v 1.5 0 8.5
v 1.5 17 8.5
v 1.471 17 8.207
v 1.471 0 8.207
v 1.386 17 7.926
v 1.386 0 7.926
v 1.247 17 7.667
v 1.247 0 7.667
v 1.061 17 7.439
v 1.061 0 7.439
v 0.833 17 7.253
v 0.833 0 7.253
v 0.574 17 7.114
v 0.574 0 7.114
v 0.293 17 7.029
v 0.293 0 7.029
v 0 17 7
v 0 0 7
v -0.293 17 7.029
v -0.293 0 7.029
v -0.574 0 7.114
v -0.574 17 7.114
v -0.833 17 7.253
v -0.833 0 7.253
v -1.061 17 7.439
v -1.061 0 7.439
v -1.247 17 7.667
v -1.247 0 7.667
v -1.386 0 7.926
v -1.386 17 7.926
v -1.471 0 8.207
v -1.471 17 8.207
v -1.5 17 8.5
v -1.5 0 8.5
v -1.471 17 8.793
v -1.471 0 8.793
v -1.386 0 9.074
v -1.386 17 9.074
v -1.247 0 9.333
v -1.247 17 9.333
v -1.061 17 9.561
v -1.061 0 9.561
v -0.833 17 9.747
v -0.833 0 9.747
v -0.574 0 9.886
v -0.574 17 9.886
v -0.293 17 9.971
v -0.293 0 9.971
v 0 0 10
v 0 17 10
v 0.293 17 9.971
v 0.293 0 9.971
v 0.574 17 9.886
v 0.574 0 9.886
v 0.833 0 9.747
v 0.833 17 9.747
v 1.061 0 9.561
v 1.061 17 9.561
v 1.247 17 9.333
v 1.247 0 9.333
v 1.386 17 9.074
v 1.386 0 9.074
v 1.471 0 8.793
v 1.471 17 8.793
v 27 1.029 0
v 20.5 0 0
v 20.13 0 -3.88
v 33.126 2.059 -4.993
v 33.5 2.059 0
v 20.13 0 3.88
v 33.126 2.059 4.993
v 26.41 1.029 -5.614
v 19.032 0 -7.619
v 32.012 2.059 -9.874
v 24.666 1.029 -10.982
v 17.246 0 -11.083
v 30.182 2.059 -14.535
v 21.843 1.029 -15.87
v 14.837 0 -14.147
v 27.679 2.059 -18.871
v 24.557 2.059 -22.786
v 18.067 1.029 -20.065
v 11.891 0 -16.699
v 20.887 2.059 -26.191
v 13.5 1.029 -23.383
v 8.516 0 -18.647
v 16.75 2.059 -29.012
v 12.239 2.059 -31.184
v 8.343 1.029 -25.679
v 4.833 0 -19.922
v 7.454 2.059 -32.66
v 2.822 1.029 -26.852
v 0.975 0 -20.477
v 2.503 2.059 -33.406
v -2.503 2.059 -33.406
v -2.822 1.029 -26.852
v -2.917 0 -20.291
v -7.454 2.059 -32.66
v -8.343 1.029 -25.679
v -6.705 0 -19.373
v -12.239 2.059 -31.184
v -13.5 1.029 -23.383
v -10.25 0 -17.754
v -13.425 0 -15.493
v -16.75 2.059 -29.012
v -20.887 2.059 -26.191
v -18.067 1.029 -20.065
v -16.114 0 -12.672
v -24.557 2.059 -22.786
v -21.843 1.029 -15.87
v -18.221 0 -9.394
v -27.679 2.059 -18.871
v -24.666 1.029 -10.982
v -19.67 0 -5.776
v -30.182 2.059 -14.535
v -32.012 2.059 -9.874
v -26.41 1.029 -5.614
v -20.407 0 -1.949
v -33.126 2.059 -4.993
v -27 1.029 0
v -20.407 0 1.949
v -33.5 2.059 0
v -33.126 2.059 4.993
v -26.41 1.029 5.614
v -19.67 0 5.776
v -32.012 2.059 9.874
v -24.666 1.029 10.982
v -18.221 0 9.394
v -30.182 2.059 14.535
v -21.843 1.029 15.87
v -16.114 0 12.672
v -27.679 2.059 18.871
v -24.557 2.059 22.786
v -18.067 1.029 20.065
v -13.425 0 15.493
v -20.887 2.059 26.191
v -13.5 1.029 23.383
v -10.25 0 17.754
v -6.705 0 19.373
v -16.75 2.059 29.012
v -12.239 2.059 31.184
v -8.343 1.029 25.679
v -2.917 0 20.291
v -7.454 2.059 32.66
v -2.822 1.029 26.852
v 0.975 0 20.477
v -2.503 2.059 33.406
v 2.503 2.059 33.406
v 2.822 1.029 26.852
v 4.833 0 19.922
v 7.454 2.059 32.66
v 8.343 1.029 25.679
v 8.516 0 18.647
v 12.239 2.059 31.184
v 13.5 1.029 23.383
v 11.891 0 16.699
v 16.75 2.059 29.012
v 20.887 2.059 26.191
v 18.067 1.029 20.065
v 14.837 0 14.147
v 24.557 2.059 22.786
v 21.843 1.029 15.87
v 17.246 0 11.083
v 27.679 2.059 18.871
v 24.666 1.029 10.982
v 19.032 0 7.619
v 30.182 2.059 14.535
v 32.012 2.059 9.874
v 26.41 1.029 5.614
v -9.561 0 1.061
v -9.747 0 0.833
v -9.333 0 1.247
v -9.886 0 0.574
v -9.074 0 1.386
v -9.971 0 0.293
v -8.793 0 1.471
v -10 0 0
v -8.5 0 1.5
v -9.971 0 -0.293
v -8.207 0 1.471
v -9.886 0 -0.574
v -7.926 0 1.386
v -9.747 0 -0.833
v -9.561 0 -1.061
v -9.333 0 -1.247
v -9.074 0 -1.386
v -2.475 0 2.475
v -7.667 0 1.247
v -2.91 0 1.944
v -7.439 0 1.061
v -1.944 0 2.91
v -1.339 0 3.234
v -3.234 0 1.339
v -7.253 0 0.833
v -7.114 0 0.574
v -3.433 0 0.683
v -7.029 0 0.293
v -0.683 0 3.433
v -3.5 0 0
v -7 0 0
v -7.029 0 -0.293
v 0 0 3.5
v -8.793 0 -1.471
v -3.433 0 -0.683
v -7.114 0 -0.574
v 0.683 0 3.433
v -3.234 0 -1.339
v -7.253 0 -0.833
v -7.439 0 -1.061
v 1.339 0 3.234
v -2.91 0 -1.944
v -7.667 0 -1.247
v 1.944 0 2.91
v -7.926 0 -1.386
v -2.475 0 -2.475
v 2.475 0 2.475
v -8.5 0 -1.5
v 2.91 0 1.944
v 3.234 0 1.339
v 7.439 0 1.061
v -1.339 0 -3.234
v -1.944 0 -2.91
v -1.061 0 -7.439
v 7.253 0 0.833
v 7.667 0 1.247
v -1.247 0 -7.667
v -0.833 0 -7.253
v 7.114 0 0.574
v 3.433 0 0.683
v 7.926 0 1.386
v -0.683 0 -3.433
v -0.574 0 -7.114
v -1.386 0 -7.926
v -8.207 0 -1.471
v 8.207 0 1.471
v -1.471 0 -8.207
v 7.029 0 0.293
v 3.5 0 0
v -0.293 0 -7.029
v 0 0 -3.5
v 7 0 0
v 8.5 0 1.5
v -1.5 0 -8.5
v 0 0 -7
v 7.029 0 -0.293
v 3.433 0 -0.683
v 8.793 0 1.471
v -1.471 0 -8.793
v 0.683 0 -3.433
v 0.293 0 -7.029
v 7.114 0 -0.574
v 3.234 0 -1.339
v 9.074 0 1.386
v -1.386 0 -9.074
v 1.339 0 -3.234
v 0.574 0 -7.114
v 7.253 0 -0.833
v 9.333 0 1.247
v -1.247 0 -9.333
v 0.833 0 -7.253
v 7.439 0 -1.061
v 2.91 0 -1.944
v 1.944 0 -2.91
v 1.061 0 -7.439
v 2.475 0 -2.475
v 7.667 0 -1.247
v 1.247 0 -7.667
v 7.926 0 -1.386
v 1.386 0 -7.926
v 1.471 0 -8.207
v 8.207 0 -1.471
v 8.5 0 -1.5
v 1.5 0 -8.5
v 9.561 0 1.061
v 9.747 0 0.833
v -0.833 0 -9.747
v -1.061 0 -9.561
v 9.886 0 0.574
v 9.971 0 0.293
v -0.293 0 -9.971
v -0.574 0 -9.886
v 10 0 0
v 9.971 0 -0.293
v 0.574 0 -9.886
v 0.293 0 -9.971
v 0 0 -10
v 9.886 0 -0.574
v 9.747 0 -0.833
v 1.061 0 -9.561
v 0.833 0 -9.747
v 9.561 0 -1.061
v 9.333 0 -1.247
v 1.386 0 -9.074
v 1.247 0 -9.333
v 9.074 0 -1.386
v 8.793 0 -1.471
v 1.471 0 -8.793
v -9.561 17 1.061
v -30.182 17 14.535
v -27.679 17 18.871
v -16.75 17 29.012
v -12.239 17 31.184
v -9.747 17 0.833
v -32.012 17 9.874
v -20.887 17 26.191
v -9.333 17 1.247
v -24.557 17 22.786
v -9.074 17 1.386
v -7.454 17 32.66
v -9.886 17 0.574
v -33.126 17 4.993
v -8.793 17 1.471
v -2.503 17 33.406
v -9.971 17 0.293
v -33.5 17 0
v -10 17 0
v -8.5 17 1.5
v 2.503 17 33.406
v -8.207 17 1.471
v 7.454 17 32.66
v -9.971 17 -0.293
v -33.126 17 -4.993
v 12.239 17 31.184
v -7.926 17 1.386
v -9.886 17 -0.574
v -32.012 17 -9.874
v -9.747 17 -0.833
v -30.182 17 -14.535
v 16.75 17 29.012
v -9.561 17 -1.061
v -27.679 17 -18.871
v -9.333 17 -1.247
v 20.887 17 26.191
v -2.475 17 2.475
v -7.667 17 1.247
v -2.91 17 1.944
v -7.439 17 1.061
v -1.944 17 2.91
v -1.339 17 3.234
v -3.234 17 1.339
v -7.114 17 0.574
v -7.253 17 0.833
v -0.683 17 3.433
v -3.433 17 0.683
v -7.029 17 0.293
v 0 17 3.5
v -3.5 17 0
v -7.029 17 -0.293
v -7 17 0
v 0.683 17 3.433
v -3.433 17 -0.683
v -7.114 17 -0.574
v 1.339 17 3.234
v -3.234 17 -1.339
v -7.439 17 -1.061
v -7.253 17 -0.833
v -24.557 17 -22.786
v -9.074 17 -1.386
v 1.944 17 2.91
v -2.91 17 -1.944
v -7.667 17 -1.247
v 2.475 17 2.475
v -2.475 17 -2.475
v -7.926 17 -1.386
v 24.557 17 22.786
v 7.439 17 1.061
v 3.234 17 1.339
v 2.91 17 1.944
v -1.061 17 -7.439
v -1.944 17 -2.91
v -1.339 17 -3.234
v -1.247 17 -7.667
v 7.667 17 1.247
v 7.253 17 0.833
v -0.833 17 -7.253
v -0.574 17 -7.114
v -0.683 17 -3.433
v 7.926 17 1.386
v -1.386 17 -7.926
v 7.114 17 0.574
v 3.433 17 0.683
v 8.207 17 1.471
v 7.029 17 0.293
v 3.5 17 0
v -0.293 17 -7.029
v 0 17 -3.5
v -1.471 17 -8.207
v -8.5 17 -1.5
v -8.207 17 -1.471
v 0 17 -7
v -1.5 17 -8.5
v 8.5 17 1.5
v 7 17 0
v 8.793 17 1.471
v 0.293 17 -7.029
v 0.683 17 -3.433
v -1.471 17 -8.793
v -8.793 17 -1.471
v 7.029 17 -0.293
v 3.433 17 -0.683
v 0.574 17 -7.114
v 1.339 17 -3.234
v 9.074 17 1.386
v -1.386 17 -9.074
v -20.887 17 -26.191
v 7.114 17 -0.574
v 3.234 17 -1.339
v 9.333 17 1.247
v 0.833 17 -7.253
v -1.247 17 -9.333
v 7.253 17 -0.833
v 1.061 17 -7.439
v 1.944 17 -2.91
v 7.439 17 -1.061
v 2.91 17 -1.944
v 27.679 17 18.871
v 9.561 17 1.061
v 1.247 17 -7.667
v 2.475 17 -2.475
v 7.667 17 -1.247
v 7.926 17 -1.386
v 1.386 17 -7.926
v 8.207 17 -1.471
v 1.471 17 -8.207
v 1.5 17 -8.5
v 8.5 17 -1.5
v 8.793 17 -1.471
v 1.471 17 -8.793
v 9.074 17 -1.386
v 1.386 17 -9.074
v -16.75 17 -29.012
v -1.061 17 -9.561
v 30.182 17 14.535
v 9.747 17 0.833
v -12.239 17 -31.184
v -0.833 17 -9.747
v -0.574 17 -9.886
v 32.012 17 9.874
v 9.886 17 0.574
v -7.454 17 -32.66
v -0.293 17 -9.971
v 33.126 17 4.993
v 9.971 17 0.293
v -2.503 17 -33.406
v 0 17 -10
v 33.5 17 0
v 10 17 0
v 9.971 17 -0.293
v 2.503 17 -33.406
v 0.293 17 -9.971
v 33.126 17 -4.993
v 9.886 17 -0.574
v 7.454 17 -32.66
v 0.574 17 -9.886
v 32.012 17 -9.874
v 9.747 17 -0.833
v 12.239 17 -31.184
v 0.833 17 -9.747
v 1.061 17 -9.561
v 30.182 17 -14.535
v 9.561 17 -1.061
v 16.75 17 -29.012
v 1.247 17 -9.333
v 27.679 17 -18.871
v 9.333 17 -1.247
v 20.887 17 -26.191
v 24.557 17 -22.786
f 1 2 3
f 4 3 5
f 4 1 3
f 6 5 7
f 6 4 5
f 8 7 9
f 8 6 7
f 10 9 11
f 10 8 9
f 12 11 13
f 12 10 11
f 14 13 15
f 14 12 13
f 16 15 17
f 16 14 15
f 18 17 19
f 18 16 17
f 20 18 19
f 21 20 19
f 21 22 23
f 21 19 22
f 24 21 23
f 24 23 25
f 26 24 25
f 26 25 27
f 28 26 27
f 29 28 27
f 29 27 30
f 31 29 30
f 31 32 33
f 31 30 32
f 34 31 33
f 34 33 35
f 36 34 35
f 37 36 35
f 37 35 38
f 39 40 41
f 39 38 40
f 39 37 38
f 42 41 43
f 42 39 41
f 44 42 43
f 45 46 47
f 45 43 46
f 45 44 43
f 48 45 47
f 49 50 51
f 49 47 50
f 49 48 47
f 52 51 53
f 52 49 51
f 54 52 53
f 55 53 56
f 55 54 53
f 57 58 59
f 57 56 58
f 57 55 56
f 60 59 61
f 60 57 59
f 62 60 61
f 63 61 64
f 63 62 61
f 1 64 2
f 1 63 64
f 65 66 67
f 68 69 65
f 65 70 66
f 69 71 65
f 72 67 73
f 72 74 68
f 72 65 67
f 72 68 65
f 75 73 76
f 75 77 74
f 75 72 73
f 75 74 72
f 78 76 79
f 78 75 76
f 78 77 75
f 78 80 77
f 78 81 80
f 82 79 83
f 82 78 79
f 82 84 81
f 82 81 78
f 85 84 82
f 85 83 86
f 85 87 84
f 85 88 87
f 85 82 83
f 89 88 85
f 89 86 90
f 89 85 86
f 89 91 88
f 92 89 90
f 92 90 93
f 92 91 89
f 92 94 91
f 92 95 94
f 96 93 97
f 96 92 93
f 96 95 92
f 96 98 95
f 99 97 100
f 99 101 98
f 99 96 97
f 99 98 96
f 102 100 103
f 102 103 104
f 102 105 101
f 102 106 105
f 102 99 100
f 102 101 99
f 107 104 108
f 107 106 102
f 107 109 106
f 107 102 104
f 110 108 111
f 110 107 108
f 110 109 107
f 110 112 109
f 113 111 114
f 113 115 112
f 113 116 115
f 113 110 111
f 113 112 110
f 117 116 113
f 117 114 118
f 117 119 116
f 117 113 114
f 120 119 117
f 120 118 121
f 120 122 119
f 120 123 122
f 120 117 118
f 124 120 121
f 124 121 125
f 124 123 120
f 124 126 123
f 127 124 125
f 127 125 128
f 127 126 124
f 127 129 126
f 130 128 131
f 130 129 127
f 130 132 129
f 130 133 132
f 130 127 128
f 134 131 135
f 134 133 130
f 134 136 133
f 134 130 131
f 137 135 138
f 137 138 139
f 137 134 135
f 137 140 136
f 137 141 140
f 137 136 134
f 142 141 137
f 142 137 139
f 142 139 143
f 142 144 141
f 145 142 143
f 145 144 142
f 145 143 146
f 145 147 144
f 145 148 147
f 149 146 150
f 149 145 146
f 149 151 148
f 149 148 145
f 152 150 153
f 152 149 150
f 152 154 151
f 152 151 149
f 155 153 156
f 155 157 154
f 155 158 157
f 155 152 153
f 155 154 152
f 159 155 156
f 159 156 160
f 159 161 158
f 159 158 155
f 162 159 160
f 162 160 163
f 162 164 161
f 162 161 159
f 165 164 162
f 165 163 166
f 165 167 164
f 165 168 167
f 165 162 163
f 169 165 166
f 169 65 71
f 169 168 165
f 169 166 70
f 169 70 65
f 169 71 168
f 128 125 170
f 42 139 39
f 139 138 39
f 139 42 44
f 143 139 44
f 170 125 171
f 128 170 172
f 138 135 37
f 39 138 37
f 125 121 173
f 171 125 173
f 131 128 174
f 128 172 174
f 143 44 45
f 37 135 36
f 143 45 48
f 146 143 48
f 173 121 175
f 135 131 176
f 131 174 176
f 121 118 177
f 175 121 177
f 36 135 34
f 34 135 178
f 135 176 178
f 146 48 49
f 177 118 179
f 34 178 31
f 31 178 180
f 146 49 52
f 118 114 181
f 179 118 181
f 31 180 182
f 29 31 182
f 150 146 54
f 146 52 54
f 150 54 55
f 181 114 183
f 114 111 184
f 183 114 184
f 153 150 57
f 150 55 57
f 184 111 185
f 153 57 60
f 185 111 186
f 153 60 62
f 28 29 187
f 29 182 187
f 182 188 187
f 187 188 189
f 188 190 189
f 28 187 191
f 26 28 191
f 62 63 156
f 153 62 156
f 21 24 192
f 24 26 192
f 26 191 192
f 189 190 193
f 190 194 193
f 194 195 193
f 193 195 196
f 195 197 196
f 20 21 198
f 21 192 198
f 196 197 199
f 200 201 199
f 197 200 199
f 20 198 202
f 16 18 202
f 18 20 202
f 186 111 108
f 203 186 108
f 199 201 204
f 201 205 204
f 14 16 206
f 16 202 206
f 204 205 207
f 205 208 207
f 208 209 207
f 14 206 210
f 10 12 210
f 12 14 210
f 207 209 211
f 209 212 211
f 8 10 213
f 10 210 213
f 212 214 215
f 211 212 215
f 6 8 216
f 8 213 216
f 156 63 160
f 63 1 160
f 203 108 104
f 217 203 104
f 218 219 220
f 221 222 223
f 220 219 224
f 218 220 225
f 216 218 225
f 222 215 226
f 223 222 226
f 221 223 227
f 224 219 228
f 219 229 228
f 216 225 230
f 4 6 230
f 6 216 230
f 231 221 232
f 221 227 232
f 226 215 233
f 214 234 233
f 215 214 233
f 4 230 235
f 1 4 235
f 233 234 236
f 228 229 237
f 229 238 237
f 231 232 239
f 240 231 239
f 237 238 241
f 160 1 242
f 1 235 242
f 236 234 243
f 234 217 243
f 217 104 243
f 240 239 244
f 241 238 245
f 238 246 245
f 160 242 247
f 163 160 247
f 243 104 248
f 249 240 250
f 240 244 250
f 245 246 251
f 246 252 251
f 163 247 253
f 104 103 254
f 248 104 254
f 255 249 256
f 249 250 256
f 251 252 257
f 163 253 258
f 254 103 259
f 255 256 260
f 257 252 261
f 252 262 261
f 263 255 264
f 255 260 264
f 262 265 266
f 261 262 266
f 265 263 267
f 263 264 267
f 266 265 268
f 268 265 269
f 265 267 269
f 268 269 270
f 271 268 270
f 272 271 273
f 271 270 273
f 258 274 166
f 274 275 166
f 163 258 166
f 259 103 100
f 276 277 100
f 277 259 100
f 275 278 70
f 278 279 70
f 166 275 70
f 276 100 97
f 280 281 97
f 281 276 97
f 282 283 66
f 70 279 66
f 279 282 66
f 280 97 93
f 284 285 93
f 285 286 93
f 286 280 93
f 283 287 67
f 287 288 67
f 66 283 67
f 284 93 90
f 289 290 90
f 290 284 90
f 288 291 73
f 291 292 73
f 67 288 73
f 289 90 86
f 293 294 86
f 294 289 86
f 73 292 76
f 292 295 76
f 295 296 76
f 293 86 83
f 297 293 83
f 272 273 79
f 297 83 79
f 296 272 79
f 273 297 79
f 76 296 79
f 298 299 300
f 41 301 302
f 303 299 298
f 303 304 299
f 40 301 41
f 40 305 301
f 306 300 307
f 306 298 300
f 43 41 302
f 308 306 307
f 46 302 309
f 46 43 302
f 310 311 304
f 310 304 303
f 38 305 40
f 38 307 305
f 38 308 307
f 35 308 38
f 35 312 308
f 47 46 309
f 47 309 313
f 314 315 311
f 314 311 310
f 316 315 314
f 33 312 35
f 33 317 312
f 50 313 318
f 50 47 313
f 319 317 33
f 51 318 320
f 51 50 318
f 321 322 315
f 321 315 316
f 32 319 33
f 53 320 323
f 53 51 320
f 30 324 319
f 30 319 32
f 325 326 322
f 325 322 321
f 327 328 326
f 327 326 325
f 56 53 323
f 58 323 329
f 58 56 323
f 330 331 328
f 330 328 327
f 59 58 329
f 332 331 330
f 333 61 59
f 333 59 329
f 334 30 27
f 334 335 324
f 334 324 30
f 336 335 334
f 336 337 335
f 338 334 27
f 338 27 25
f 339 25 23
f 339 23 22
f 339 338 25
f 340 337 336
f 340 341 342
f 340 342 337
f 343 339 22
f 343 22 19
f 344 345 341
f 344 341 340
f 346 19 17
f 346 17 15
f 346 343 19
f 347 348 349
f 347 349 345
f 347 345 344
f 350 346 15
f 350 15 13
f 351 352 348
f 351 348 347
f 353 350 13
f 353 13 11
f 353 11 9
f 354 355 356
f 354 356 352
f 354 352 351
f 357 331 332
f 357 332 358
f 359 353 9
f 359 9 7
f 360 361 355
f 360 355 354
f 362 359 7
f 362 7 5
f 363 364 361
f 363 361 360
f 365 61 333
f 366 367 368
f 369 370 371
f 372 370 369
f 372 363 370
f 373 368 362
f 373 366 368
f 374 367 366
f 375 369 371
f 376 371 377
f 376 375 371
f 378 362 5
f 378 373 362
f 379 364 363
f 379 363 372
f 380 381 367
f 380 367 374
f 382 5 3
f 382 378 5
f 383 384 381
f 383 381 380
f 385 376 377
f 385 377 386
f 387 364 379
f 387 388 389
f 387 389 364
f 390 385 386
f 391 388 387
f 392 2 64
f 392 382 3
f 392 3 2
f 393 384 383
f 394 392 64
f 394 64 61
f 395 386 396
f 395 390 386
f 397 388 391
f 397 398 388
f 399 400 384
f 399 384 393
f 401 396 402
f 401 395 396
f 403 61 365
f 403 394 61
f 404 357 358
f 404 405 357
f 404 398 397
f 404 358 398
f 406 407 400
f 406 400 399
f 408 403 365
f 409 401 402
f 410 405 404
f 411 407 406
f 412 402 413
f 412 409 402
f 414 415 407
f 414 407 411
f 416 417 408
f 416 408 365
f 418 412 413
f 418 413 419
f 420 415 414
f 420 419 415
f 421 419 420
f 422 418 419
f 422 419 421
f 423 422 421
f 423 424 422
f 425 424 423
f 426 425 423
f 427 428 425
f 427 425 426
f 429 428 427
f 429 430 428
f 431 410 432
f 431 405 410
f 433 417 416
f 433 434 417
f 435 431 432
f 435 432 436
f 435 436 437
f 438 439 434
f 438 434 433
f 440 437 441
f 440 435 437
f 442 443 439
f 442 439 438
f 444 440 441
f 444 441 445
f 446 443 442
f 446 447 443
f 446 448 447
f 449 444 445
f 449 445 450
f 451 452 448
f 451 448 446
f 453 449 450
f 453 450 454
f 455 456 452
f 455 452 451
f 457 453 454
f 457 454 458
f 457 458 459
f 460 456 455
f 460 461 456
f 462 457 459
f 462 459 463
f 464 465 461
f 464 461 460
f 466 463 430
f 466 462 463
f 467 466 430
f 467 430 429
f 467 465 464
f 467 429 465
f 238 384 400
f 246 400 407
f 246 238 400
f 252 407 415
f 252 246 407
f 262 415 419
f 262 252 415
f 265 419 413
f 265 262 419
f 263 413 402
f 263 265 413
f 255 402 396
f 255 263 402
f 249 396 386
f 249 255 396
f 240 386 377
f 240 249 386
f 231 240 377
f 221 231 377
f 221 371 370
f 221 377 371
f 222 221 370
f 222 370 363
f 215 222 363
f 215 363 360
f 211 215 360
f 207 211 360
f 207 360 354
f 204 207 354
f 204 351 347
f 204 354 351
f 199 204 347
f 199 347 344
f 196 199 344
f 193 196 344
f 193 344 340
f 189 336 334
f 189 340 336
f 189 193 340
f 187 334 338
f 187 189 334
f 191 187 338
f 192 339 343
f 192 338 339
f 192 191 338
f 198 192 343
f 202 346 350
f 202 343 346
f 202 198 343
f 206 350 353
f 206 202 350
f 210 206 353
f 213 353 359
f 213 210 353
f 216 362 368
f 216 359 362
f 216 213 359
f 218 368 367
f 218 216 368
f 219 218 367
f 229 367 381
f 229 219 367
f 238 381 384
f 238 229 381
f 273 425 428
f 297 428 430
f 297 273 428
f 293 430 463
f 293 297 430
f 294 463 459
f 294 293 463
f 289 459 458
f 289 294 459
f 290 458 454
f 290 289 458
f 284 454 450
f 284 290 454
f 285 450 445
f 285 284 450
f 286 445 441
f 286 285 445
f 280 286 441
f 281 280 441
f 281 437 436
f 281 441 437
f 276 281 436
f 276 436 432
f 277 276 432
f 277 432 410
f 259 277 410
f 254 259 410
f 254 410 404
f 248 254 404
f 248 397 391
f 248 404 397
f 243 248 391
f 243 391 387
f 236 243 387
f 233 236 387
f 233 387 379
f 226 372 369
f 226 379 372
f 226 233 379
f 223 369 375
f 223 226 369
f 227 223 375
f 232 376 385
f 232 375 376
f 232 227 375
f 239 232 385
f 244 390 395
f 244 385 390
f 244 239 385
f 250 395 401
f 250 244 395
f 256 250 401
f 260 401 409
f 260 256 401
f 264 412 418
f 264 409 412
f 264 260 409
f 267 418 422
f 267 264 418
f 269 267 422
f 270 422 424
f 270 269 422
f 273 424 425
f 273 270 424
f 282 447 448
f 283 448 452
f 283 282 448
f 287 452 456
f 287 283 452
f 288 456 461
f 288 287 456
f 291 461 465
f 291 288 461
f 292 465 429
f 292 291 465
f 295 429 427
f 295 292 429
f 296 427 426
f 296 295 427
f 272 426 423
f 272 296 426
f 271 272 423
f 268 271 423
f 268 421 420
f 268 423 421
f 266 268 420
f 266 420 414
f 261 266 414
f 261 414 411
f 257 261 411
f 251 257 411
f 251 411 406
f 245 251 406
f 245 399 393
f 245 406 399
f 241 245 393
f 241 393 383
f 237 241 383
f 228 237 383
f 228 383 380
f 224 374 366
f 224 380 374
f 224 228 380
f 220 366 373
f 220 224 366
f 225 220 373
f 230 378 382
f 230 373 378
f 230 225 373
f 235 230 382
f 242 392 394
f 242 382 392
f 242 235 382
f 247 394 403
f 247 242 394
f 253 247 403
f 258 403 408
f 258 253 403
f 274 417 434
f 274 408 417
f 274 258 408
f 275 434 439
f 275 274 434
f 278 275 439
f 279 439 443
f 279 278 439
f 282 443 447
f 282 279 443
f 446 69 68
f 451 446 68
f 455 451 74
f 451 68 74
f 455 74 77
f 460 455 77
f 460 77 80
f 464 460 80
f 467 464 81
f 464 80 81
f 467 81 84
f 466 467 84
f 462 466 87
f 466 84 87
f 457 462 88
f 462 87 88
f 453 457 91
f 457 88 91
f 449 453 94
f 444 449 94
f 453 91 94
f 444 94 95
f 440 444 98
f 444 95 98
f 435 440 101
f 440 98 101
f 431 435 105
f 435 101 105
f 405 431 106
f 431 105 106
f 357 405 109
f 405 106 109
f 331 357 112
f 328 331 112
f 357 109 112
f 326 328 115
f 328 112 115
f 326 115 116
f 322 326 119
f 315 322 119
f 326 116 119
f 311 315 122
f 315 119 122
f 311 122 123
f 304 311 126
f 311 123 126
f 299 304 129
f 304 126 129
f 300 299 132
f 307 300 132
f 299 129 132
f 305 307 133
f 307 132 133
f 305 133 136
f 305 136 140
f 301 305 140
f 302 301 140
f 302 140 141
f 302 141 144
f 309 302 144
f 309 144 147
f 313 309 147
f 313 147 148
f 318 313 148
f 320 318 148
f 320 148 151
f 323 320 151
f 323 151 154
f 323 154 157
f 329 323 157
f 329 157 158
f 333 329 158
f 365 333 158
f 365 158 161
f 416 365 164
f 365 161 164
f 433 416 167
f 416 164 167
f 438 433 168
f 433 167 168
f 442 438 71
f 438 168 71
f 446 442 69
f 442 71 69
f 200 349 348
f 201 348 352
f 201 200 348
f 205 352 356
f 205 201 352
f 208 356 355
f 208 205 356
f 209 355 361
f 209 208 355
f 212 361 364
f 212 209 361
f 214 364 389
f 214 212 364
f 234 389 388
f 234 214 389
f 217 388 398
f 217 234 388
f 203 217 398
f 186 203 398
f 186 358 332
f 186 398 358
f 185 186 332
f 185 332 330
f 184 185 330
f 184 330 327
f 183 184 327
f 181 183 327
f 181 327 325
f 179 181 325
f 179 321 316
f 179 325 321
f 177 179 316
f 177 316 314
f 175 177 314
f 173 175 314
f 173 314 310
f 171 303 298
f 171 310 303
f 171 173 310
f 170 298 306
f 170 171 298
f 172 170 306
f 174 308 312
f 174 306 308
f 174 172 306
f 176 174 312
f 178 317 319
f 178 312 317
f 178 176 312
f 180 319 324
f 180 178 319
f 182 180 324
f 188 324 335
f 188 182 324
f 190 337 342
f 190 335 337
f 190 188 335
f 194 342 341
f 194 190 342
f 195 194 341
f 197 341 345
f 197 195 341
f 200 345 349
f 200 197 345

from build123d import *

# Parameters (mm, degrees)
SKETCH1_R               = 33.5
BOSS_EXTRUDE1_DEPTH     = 17
SKETCH2_R               = 3.5
CUT_EXTRUDE1_DEPTH      = 100
CUT_EXTRUDE1_DEPTH_BACK = 100
SKETCH3_R               = 1.5
CUT_EXTRUDE2_DEPTH      = 100
CUT_EXTRUDE2_DEPTH_BACK = 100
CHAMFER1_SIZE           = 13
CHAMFER1_SIZE2          = 2.058997724


with BuildPart() as part:
    # Sketch1 → Boss-Extrude1 (new body)
    with BuildSketch(Plane(origin=(0, 0, 0), x_dir=(1, 0, 0), z_dir=(0, 1, 0))):
        Circle(SKETCH1_R)
    extrude(amount=BOSS_EXTRUDE1_DEPTH)

    # Sketch2 → Cut-Extrude1 (cut, two sides)
    with BuildSketch(Plane(origin=(0, 0, 0), x_dir=(1, 0, 0), z_dir=(0, 1, 0))) as cut_extrude1_sk:
        Circle(SKETCH2_R)
    extrude(amount=CUT_EXTRUDE1_DEPTH, mode=Mode.SUBTRACT)
    extrude(cut_extrude1_sk.sketch, amount=-CUT_EXTRUDE1_DEPTH_BACK, mode=Mode.SUBTRACT)

    # Sketch3 → Cut-Extrude2 (cut, two sides)
    with BuildSketch(Plane(origin=(0, 0, 0), x_dir=(1, 0, 0), z_dir=(0, 1, 0))) as cut_extrude2_sk:
        with Locations((8.5, 0)):
            Circle(SKETCH3_R)
        with Locations((-8.5, 0)):
            Circle(SKETCH3_R)
        with Locations((0, -8.5)):
            Circle(SKETCH3_R)
        with Locations((0, 8.5)):
            Circle(SKETCH3_R)
    extrude(amount=CUT_EXTRUDE2_DEPTH, mode=Mode.SUBTRACT)
    extrude(cut_extrude2_sk.sketch, amount=-CUT_EXTRUDE2_DEPTH_BACK, mode=Mode.SUBTRACT)

    # Chamfer1
    chamfer1_edges = [part.edges().sort_by_distance(p)[0] for p in [
        (-33.5, 0, 0),
    ]]
    chamfer1_side = [part.faces().sort_by_distance(p)[0] for p in [
        (-32.552476913, 0, 0),
    ]]
    chamfer(chamfer1_edges, length=CHAMFER1_SIZE, length2=CHAMFER1_SIZE2, reference=chamfer1_side[0])


solid = part.part
